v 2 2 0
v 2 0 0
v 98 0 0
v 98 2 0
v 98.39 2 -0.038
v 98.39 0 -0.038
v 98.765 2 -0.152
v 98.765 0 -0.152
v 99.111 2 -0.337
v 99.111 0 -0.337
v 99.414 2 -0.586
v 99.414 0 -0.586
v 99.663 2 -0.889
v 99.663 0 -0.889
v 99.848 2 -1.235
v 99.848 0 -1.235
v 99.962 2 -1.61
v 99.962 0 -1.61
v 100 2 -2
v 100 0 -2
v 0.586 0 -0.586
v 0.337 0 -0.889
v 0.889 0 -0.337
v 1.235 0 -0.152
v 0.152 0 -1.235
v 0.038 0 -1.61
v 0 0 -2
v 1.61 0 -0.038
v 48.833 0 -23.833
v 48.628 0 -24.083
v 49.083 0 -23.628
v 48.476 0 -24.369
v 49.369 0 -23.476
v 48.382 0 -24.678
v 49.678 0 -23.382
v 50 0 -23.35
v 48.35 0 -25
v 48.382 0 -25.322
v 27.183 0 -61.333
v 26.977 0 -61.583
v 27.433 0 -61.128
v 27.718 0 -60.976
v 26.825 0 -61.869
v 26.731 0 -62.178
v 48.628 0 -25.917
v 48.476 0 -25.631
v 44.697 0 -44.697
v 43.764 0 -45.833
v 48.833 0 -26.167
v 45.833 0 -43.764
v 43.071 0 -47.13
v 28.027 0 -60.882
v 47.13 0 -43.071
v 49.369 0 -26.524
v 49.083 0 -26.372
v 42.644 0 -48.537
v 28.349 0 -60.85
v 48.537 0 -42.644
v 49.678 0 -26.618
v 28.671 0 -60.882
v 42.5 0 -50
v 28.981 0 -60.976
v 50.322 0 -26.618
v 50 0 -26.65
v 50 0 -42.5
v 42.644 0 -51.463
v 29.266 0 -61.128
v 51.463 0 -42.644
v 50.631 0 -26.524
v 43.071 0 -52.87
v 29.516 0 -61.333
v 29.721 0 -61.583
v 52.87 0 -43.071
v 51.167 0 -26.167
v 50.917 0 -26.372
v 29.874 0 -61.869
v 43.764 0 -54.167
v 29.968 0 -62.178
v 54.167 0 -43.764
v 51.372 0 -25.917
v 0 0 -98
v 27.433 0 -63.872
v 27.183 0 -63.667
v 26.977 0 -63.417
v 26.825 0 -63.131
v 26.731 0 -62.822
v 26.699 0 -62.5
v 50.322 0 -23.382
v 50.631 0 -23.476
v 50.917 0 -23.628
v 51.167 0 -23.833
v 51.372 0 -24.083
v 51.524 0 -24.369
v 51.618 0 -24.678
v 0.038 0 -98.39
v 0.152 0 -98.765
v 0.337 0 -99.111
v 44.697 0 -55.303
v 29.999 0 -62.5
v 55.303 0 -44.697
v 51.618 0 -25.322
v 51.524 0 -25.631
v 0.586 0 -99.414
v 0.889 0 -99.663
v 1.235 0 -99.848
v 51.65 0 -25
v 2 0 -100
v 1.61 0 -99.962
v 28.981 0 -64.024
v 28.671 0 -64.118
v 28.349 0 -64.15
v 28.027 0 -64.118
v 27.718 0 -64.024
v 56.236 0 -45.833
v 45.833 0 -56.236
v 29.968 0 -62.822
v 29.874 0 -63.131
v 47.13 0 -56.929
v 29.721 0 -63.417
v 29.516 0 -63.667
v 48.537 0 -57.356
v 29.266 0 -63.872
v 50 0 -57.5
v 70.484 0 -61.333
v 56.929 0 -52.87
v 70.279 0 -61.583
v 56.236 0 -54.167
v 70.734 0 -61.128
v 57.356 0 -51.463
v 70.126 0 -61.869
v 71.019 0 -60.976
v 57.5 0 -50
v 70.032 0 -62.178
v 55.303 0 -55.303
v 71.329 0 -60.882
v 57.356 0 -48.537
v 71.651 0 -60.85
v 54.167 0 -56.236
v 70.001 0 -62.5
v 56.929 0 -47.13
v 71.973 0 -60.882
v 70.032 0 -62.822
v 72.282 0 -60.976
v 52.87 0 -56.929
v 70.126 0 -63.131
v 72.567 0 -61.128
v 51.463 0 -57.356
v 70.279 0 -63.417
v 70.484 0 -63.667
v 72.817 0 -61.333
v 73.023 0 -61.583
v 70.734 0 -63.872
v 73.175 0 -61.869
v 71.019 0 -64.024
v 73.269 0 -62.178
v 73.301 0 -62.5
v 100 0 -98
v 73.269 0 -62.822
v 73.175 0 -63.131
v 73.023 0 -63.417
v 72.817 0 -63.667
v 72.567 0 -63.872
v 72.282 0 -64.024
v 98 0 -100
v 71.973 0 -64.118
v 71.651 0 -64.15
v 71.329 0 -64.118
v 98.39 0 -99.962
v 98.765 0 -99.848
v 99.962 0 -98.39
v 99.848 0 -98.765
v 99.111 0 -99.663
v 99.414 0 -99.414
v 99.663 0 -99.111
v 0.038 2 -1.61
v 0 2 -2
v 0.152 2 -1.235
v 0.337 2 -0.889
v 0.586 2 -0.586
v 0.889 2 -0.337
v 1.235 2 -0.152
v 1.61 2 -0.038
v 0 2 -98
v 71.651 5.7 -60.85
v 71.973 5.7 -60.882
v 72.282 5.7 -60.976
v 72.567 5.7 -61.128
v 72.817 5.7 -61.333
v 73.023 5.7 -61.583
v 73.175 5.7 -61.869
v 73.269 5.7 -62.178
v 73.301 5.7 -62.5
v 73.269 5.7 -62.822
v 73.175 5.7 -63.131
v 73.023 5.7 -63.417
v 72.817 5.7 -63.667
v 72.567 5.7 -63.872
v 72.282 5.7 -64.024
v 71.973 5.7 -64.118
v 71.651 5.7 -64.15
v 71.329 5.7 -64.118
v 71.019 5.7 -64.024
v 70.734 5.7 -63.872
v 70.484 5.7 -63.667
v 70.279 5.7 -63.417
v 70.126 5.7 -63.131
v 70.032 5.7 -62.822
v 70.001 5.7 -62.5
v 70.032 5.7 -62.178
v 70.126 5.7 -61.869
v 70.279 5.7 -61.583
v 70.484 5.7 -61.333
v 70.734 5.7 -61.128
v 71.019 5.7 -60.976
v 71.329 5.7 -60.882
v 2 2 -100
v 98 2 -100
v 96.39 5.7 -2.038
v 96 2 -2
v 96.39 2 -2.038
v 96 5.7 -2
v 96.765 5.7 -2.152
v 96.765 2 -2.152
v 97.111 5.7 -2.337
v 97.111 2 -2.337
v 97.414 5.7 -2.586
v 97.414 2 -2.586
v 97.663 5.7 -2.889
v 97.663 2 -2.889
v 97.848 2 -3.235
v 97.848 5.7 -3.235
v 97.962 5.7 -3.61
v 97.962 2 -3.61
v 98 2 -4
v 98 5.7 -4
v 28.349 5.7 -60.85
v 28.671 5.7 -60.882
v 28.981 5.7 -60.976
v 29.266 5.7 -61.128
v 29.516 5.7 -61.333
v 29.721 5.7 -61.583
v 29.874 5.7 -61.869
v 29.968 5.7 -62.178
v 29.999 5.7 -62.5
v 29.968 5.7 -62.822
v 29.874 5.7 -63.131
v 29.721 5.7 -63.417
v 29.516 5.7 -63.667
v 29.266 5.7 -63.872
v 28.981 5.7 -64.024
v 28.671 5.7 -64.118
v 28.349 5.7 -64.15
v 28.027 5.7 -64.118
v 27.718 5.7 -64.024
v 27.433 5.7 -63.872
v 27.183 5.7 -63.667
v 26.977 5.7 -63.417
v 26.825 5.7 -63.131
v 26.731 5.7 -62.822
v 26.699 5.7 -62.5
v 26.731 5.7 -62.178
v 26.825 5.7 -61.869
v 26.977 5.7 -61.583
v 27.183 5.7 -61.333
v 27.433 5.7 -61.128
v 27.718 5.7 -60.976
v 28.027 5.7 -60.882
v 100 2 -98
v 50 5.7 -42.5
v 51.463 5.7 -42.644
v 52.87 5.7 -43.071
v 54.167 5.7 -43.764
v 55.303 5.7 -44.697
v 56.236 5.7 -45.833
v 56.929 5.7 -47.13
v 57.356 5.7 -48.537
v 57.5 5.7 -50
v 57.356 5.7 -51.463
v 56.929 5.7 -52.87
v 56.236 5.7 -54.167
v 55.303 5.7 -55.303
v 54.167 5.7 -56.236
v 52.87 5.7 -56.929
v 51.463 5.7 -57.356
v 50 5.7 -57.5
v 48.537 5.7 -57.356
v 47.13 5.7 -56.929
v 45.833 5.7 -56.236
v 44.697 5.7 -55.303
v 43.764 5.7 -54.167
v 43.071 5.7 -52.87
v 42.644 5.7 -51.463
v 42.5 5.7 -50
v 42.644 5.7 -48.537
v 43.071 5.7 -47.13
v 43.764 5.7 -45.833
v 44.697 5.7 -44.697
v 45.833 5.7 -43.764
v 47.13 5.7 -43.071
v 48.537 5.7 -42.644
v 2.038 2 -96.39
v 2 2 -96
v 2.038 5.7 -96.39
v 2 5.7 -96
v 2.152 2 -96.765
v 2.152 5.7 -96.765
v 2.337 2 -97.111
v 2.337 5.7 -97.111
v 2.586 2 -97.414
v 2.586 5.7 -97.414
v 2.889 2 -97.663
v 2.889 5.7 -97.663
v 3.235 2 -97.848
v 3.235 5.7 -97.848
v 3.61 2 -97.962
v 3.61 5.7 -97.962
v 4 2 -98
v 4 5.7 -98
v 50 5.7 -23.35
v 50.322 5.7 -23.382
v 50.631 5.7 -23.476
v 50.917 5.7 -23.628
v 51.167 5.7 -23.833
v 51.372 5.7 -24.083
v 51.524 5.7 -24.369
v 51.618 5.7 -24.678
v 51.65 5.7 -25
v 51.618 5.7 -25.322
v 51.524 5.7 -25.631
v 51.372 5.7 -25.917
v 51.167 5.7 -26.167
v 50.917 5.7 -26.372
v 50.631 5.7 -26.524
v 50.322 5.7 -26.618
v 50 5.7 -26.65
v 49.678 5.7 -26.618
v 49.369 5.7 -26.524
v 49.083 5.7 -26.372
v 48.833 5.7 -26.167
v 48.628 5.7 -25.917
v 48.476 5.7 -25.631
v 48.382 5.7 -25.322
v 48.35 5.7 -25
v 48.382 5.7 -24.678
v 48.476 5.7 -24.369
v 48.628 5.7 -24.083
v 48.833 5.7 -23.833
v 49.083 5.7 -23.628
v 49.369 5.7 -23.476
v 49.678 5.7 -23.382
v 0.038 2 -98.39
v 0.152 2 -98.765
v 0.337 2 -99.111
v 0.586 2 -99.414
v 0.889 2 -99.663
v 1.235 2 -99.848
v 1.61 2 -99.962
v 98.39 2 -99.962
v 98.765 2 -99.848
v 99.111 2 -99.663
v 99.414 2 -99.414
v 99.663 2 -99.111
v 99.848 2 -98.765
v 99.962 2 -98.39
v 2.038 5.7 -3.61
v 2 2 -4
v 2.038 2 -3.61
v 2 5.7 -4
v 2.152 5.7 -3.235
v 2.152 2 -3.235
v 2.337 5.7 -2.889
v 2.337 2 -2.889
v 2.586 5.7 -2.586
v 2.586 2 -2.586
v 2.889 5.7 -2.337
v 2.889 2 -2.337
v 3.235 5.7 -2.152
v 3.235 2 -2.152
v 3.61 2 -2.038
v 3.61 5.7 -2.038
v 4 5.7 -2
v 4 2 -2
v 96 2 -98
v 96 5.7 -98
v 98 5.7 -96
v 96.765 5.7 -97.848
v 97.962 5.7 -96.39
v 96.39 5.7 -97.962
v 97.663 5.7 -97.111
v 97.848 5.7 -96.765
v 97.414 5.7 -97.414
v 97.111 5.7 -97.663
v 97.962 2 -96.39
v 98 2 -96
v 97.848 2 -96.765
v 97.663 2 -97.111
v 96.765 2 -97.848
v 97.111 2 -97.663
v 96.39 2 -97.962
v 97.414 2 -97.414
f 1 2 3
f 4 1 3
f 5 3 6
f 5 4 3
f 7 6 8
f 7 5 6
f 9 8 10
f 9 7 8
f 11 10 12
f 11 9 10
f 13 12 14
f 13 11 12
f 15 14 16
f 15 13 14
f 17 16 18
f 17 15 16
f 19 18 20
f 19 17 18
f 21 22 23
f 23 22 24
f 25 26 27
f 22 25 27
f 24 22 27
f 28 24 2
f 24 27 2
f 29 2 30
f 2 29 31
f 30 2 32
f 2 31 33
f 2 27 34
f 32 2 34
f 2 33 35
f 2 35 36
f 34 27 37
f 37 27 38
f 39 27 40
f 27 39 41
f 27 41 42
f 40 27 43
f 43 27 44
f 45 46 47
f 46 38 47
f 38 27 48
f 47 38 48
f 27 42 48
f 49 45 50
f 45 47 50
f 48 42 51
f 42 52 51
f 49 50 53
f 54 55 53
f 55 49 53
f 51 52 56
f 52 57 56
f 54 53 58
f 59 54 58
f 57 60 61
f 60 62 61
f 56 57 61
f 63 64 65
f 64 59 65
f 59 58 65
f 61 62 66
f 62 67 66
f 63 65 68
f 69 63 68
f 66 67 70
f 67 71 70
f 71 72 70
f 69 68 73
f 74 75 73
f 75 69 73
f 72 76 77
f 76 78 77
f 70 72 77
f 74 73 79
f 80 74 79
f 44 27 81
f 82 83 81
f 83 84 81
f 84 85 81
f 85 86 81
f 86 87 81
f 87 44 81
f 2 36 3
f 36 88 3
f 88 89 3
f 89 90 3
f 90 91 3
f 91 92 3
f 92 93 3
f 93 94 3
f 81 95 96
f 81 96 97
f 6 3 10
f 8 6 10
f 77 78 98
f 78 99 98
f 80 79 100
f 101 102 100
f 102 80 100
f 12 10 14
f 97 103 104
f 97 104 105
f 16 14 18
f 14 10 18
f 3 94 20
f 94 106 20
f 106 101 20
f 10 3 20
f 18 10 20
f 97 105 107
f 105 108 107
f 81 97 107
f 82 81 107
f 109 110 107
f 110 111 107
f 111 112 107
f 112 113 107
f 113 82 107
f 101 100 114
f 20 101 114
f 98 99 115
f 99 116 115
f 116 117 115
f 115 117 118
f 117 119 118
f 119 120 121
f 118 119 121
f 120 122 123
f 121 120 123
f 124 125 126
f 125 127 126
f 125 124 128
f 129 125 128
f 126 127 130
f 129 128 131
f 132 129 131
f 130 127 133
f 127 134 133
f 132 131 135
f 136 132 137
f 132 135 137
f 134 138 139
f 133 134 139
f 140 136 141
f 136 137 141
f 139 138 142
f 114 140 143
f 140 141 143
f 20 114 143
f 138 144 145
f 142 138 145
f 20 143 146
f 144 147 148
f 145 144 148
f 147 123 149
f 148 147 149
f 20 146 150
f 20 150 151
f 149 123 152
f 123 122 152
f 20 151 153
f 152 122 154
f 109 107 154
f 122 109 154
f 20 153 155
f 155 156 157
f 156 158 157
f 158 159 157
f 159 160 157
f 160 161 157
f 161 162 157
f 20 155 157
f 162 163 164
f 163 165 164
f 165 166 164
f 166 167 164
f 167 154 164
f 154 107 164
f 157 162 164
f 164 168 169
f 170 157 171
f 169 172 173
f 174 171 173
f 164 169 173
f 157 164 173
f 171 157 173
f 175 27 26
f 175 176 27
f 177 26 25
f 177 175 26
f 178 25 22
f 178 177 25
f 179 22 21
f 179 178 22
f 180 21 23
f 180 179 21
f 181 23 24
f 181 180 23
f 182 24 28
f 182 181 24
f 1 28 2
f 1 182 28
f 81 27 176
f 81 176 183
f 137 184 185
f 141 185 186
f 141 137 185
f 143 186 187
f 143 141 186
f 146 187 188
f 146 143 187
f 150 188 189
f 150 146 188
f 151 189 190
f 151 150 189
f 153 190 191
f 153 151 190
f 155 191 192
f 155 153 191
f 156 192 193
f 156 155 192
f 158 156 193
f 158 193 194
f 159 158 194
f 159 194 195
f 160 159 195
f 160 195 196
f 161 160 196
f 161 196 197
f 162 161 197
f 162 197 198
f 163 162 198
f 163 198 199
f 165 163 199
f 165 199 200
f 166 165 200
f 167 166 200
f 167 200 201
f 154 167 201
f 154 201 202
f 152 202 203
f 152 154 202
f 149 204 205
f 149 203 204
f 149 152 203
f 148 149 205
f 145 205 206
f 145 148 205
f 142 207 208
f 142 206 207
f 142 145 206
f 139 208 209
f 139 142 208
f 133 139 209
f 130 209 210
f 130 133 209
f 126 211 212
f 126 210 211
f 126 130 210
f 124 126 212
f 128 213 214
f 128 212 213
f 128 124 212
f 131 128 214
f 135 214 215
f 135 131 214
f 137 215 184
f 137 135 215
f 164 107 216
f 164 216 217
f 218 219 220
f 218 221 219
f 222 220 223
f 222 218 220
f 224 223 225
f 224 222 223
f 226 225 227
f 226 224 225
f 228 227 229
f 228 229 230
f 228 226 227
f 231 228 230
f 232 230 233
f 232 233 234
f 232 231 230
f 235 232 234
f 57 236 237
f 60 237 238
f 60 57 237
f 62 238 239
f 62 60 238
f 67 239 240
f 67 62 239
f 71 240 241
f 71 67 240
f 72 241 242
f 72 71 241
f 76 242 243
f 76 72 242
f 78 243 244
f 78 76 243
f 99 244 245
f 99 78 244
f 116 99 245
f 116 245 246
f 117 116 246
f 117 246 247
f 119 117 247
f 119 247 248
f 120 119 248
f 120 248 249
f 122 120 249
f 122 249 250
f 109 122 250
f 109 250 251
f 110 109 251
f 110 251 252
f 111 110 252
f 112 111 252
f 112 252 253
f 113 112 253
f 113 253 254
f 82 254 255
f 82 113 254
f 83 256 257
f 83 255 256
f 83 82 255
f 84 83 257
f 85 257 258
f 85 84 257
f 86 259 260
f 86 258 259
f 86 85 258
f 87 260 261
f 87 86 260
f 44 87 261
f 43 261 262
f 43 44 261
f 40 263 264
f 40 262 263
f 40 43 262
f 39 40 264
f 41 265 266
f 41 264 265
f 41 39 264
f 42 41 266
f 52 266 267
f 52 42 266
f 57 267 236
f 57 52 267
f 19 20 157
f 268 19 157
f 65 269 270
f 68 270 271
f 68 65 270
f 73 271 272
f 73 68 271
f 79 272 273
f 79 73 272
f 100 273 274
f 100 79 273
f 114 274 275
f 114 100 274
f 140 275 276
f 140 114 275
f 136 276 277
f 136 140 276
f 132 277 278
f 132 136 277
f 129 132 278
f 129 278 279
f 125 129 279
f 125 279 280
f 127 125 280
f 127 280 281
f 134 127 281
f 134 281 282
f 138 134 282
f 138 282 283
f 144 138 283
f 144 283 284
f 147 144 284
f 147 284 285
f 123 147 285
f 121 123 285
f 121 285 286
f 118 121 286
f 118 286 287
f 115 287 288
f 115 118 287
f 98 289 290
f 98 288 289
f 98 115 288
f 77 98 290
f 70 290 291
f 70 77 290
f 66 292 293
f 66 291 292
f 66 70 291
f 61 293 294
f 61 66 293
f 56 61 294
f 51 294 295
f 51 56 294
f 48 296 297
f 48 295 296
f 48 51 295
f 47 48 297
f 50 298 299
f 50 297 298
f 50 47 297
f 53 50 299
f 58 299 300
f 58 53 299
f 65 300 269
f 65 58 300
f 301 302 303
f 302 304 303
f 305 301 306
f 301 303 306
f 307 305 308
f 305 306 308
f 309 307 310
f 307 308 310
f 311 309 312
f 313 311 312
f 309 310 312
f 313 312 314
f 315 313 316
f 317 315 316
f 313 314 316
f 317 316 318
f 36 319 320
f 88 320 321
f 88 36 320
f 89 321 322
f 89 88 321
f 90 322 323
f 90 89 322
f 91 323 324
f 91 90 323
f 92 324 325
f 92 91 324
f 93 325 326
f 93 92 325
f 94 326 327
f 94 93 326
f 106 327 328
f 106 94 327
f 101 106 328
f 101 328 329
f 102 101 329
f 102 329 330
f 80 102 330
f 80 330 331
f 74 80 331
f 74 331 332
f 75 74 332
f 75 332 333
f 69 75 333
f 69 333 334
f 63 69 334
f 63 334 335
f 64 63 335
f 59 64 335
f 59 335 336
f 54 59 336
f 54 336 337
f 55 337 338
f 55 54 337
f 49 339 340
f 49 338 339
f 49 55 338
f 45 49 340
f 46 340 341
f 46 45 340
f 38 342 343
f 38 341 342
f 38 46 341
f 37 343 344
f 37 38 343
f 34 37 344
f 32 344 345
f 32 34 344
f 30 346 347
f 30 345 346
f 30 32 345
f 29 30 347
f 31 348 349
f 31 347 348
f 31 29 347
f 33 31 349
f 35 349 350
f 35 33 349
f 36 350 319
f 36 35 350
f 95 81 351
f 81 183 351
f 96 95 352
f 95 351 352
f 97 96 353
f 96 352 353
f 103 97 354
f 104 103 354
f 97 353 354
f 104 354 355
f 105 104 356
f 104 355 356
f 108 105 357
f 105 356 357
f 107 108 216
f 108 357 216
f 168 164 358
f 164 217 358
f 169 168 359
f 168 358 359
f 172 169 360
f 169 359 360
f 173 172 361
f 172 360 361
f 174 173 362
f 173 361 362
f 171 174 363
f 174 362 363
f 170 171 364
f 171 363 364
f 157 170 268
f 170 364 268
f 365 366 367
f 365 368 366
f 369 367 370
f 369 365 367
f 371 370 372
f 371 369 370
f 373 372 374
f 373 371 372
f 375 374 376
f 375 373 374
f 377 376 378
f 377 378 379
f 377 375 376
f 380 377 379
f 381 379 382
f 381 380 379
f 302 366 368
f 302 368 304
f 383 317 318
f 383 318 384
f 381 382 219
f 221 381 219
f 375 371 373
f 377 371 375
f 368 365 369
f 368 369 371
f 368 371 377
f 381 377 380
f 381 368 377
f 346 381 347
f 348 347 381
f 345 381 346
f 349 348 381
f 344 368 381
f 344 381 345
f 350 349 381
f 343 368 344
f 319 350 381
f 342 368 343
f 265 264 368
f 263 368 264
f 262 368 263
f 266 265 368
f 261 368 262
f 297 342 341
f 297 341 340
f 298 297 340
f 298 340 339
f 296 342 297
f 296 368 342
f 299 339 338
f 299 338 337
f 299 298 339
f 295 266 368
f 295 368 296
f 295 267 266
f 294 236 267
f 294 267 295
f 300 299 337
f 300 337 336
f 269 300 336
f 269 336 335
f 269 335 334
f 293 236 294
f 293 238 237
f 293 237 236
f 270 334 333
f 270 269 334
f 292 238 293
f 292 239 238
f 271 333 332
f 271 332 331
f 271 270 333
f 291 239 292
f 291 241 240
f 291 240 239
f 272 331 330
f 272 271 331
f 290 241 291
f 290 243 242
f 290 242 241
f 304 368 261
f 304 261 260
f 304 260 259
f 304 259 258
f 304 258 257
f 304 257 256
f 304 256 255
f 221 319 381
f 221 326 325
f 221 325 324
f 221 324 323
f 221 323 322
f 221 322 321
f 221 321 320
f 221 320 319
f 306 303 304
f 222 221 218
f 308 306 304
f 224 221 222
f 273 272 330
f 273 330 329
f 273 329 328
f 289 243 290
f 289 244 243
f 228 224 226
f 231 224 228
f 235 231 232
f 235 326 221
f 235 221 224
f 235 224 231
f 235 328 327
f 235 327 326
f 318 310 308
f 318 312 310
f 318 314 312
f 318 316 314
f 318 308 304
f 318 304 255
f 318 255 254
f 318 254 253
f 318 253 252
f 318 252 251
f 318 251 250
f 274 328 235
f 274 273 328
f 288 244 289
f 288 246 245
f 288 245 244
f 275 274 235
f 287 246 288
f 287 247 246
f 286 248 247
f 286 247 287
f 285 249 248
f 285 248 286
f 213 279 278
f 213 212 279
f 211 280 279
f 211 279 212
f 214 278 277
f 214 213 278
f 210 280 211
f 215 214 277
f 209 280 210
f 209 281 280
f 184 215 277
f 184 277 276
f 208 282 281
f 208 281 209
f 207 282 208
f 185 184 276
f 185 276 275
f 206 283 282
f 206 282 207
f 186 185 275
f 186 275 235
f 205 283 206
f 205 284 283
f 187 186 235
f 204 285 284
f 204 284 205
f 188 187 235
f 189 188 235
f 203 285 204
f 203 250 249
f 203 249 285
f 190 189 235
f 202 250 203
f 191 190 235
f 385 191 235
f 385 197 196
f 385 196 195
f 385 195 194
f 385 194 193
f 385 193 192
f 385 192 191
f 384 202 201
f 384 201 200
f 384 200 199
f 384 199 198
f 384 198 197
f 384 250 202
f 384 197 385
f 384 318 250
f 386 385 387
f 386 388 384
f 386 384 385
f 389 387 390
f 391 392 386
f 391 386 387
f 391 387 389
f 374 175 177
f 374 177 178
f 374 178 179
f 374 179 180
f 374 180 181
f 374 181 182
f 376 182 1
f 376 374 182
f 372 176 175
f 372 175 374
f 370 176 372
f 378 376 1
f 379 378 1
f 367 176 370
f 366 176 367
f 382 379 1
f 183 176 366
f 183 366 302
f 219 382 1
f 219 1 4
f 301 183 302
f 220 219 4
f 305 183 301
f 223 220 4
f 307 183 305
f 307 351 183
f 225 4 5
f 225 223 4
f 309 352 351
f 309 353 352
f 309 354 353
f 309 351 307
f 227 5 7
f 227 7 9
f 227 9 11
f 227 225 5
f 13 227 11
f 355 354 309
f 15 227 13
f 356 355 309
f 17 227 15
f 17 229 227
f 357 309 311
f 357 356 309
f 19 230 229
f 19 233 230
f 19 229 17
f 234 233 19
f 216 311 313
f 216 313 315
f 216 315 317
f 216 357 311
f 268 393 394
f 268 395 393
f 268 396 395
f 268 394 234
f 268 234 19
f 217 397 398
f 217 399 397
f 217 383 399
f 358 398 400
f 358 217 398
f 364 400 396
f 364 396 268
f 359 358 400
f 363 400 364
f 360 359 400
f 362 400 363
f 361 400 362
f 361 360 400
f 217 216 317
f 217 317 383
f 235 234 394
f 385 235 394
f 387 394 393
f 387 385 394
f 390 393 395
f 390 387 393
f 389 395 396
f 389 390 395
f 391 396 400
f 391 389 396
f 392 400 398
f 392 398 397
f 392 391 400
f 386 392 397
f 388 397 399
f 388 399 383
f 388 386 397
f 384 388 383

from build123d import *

# Parameters (mm, degrees)
ESBO_O2_W                = 100
ESBO_O2_H                = 100
RESSALTO_EXTRUS_O1_DEPTH = 2
ESBO_O2_3_W              = 96
ESBO_O2_3_H              = 96
RESSALTO_EXTRUS_O2_DEPTH = 5.7
FILETE2_R                = 2
ESBO_O4_R                = 7.5
ESBO_O4_R_2              = 1.65
CORTE_EXTRUS_O1_DEPTH    = 142.53617912


with BuildPart() as part:
    # Esboço2 → Ressalto-extrusão1 (new body)
    with BuildSketch(Plane(origin=(0, 0, 0), x_dir=(1, 0, 0), z_dir=(0, 1, 0))):
        with Locations((50, 50)):
            Rectangle(ESBO_O2_W, ESBO_O2_H)
    extrude(amount=RESSALTO_EXTRUS_O1_DEPTH)

    # Esboço2<3> → Ressalto-extrusão2 (add)
    with BuildSketch(Plane(origin=(0, 0, 0), x_dir=(1, 0, 0), z_dir=(0, 1, 0))):
        with Locations((50, 50)):
            Rectangle(ESBO_O2_3_W, ESBO_O2_3_H)
    extrude(amount=RESSALTO_EXTRUS_O2_DEPTH)

    # Filete2
    filete2_edges = [part.edges().sort_by_distance(p)[0] for p in [
        (0, 1, 0),
        (2, 3.85, -2),
        (100, 1, 0),
        (98, 3.85, -2),
        (100, 1, -100),
        (98, 3.85, -98),
        (0, 1, -100),
        (2, 3.85, -98),
    ]]
    fillet(filete2_edges, radius=FILETE2_R)

    # Esboço4 → Corte-extrusão1 (cut, through all)
    with BuildSketch(Plane(origin=(0, 0, 0), x_dir=(1, 0, 0), z_dir=(0, 1, 0))):
        with Locations((50, 50)):
            Circle(ESBO_O4_R)
        with Locations((50, 25)):
            Circle(ESBO_O4_R_2)
        with Locations((28.349364905, 62.5)):
            Circle(ESBO_O4_R_2)
        with Locations((71.650635095, 62.5)):
            Circle(ESBO_O4_R_2)
    extrude(amount=CORTE_EXTRUS_O1_DEPTH, mode=Mode.SUBTRACT)


solid = part.part
